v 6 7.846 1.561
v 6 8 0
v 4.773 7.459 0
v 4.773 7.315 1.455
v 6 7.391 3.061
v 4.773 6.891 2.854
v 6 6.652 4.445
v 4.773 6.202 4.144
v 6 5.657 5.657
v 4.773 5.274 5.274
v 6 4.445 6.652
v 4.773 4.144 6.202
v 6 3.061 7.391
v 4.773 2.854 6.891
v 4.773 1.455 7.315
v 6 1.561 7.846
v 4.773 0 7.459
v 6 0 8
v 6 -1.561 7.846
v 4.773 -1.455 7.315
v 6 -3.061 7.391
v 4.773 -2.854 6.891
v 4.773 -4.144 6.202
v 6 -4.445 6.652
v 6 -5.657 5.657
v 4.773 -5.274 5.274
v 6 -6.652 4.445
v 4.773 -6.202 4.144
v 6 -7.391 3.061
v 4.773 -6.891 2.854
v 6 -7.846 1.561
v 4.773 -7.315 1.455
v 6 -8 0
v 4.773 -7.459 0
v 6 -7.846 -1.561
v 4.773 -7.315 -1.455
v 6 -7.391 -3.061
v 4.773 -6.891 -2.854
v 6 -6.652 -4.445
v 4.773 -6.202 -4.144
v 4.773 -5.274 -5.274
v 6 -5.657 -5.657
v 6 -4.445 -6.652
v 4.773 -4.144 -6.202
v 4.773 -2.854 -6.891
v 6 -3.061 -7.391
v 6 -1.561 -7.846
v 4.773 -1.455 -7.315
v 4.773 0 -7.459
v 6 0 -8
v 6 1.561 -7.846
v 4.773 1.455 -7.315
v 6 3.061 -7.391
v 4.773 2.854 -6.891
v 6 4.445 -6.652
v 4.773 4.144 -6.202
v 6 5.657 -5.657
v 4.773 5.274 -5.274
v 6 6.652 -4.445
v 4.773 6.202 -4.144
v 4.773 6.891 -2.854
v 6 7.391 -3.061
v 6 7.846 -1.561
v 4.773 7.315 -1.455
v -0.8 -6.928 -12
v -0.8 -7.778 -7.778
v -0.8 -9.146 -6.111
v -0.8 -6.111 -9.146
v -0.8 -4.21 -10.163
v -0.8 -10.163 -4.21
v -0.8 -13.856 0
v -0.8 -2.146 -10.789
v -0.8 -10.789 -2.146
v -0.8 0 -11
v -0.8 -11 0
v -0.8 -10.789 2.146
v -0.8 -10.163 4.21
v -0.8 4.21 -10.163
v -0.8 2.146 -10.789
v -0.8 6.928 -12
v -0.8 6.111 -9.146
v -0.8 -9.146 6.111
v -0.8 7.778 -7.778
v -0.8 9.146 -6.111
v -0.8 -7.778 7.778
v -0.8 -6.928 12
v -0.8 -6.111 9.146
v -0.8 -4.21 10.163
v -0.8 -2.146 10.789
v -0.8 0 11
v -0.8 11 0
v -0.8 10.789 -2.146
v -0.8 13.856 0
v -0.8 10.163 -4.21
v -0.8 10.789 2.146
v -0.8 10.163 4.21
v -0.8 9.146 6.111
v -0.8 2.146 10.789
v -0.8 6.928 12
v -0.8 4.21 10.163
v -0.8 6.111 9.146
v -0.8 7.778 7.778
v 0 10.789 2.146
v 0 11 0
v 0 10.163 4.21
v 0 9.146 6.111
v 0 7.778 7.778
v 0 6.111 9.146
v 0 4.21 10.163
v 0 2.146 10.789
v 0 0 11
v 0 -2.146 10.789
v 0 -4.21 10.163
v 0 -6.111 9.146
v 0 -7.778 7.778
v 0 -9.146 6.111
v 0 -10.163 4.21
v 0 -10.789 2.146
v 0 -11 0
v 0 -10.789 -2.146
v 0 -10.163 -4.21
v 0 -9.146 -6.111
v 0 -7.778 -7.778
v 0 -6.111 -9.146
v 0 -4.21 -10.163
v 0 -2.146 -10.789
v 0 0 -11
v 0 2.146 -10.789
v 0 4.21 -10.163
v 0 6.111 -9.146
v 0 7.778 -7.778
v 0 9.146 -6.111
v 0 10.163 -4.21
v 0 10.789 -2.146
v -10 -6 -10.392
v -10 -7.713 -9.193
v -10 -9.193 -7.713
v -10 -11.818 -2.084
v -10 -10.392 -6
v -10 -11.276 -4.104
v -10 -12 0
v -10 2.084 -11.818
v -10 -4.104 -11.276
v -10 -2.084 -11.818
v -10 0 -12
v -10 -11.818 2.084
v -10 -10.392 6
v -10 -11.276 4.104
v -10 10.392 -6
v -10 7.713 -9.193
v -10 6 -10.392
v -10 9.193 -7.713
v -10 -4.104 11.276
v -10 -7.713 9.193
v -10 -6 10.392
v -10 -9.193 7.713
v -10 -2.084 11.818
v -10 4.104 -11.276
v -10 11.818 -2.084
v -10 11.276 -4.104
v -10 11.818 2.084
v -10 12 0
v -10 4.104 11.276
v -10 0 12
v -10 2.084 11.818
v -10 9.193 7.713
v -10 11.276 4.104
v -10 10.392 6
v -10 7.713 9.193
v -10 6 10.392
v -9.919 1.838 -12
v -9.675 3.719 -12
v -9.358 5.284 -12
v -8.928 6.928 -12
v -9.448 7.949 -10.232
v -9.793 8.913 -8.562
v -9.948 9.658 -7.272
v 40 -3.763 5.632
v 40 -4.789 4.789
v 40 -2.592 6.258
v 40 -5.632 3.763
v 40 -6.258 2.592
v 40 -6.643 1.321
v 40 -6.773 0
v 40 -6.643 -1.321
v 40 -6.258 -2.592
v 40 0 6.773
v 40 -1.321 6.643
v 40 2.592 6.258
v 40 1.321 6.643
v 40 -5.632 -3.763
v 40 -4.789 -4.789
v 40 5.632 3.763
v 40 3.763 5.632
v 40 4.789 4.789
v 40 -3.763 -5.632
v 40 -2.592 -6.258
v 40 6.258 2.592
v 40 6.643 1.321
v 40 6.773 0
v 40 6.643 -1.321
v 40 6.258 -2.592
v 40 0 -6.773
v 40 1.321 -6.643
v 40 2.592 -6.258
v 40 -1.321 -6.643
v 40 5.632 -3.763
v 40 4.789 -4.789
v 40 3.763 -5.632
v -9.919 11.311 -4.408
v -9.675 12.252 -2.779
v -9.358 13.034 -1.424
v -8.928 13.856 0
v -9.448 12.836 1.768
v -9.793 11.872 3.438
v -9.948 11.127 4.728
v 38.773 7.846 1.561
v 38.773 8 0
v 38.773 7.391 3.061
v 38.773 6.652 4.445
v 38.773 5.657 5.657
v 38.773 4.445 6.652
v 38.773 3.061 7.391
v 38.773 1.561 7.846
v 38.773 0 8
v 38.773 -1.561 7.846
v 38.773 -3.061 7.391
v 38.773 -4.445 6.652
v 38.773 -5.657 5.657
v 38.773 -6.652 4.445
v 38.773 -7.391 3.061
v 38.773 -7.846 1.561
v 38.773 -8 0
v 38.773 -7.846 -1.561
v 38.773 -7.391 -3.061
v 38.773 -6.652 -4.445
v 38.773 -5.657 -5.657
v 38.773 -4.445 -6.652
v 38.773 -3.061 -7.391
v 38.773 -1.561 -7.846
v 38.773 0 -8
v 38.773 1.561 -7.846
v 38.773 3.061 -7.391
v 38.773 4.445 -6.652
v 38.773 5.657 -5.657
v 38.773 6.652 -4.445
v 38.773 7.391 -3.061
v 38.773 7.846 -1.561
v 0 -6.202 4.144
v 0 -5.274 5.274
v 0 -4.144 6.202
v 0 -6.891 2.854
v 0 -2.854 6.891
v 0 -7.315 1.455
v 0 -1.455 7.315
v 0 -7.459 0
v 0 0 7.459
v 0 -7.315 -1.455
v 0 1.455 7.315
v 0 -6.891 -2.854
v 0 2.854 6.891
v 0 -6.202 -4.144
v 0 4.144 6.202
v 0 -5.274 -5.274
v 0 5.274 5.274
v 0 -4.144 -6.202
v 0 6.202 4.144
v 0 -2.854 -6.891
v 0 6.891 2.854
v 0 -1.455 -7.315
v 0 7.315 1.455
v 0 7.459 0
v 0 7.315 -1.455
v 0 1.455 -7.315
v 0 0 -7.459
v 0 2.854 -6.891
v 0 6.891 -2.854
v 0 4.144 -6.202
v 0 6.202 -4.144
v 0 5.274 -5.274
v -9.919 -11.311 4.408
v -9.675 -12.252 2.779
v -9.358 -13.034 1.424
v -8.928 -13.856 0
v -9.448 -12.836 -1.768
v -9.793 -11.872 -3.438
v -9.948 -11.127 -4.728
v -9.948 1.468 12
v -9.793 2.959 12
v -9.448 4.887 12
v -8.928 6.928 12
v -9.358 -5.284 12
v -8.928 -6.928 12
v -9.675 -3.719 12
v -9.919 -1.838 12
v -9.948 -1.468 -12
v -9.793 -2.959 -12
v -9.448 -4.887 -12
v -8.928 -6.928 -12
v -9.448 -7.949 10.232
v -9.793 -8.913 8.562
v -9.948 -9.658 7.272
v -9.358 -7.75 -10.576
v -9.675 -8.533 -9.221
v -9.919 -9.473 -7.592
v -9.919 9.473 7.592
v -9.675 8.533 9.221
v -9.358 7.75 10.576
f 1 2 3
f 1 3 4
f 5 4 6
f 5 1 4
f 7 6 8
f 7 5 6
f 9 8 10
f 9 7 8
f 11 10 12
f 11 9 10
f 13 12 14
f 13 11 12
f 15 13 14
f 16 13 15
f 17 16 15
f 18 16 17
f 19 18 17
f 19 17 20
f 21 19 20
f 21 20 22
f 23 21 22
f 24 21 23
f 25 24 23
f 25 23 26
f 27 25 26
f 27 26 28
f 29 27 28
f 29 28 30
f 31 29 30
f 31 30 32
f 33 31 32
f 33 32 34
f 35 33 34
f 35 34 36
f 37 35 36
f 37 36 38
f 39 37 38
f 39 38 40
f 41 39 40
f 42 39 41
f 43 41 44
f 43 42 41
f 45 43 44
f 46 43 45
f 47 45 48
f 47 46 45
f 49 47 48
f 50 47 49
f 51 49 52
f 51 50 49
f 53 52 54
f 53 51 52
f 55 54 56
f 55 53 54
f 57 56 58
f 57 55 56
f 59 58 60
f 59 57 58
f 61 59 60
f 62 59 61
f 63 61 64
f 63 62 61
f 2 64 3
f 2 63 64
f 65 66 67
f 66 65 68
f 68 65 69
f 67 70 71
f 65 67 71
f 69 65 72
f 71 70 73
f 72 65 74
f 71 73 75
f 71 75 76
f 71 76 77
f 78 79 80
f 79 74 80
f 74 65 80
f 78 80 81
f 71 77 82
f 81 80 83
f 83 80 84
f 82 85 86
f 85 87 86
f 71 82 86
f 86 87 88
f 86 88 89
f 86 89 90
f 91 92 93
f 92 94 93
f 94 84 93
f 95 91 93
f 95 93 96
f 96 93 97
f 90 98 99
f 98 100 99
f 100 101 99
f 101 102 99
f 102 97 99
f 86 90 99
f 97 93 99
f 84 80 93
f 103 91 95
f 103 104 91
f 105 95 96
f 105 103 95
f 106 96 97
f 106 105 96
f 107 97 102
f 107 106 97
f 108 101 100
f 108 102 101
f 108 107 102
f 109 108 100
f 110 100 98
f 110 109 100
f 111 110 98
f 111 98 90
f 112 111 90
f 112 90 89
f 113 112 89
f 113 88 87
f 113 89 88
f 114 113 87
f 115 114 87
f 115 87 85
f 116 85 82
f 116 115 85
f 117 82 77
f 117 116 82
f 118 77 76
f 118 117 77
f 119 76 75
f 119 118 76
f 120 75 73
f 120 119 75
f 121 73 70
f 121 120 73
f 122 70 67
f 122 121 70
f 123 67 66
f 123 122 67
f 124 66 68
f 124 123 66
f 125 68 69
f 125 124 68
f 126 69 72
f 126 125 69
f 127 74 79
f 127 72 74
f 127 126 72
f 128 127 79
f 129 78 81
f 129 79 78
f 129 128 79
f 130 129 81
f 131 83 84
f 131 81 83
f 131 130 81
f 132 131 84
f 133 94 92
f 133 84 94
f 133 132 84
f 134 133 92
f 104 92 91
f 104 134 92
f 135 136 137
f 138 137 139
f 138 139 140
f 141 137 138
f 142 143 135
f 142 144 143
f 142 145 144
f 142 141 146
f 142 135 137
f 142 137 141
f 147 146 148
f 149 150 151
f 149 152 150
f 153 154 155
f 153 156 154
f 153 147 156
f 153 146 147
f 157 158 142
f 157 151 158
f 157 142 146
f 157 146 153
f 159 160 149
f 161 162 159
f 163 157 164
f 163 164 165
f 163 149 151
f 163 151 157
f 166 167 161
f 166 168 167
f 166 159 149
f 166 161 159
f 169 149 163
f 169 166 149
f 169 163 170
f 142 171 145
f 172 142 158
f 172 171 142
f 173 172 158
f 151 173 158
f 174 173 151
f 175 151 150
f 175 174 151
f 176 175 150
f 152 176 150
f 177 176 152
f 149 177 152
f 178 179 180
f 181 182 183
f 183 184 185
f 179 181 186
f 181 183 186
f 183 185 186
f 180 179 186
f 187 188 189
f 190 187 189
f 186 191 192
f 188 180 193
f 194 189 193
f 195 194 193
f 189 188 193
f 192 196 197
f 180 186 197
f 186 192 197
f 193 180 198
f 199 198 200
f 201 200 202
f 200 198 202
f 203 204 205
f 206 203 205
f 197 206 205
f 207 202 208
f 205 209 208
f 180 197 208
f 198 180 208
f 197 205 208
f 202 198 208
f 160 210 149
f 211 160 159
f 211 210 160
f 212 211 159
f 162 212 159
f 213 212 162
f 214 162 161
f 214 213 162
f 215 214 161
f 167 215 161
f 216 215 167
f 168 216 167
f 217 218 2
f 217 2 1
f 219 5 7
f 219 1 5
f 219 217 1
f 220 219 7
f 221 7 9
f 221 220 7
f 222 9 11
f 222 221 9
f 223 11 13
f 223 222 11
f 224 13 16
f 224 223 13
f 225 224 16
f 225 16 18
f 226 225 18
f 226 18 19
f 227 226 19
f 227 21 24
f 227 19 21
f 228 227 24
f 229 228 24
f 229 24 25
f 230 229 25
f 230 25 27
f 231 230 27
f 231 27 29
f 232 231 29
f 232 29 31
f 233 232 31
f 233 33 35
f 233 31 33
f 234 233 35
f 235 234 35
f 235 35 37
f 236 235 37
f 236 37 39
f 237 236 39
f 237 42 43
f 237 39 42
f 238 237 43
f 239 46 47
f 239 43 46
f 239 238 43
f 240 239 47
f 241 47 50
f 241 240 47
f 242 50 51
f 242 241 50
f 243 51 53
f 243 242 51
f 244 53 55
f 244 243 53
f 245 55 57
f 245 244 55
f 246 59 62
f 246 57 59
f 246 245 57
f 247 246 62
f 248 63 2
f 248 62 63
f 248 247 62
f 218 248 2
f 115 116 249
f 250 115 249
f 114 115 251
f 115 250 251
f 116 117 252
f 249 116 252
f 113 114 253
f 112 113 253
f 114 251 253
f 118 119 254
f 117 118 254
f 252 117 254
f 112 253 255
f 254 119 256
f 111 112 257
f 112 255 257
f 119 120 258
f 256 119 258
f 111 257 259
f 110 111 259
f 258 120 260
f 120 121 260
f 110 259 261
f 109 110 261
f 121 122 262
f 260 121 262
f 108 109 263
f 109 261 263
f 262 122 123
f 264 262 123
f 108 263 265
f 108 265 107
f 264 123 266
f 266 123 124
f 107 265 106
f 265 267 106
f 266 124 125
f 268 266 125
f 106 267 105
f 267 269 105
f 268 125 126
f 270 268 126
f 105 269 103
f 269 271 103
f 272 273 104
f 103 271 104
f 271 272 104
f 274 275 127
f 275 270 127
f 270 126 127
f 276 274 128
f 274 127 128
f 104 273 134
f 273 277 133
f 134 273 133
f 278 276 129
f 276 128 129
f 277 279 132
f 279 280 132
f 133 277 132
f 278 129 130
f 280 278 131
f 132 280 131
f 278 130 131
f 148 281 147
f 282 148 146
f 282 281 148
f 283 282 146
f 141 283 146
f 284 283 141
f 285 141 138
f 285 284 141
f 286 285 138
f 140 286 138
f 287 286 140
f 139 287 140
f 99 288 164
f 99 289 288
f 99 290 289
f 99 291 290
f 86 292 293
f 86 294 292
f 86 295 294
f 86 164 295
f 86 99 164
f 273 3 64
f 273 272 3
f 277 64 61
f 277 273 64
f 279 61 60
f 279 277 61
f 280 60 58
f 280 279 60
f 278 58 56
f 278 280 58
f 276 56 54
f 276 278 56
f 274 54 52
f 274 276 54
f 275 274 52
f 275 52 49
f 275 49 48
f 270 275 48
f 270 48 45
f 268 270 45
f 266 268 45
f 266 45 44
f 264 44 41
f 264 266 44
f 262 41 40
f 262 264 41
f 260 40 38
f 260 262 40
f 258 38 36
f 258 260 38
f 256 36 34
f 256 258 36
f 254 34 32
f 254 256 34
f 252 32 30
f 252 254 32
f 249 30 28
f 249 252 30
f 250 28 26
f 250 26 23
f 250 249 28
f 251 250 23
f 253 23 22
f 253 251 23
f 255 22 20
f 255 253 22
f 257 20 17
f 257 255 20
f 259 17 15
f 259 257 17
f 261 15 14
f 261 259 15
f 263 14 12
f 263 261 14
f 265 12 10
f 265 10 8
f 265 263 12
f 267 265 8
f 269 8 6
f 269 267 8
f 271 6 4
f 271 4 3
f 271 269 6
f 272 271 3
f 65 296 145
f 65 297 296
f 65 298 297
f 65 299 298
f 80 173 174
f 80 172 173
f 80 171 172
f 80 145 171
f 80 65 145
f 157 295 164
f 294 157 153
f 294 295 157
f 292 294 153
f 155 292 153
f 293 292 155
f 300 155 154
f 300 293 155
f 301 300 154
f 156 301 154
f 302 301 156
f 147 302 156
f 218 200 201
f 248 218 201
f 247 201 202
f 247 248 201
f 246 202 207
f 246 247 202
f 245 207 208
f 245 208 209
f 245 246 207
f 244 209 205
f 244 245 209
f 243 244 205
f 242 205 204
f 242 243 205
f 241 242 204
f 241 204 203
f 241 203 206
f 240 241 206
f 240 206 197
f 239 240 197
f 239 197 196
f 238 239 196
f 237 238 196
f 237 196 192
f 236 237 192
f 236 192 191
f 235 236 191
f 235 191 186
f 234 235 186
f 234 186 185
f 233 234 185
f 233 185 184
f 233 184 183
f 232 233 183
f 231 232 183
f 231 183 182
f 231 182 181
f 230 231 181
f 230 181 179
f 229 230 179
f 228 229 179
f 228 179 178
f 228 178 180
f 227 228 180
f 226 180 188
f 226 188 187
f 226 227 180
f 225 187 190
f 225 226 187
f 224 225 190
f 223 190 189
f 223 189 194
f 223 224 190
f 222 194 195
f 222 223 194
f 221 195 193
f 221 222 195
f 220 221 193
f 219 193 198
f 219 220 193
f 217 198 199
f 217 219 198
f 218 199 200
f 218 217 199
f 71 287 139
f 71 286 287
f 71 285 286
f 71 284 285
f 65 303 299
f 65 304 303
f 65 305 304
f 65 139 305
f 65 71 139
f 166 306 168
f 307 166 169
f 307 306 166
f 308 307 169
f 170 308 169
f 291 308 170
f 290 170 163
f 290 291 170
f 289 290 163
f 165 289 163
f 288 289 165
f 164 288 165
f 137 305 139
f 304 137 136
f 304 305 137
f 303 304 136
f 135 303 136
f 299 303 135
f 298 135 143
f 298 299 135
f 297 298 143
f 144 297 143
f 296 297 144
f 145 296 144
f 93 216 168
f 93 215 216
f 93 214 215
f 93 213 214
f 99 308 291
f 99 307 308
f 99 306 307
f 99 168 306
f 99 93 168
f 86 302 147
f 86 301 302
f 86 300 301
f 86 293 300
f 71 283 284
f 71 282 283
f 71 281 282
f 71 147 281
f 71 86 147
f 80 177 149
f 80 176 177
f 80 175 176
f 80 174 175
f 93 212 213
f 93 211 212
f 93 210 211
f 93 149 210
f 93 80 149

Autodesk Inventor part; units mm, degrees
ref_plane "YZ Plane" through (0, 0, 0) normal (1, 0, 0) x (0, 1, 0)
ref_plane "XZ Plane" through (0, 0, 0) normal (0, 1, 0) x (-1, 0, 0)
ref_plane "XY Plane" through (0, 0, 0) normal (0, 0, 1) x (1, 0, 0)
sketch "Skizze1" plane through (0, 0, 0) normal (0, 0, 1) x (1, 0, 0)
  line L0 (0, 11) -> (0, 7.4587)
  line L1 (6, 8) -> (40, 8)
  line L2 (40, 8) -> (40, 0)
  line L3 (40, 0) -> (-0.8001, 0)
  line L4 (-4.8801, 0) -> (52.24, 0) projected
  line L5 (-0.8001, 0) -> (-0.8001, 11)
  line L6 (-0.8001, 11) -> (0, 11)
  line L7 (6, 8) -> (4.773, 7.4587)
  line L8 (4.773, 7.4587) -> (0, 7.4587)
  line L9 (0, -1.1) -> (0, 14.3) projected
  dimension "d0" = 40
  dimension "d1" = 34
  dimension "d2" = 16
  dimension "d9" = 0.8001
  dimension "d10" = 22
  dimension "d13" = 1.227
  dimension "d14" = 14.9175
revolve "Körper" add sketch "Skizze1" angle 360 about axis through (40, 0, 0) along (-1, 0, 0)
sketch "Skizze2" plane through (-0.8001, 0, 0) normal (-1, 0, 0) x (0, 0, 1)
  line L0 (0, 13.8564) -> (12, 6.9282)
  line L1 (12, 6.9282) -> (12, -6.9282)
  line L2 (12, -6.9282) -> (0, -13.8564)
  line L3 (0, -13.8564) -> (-12, -6.9282)
  line L4 (-12, -6.9282) -> (-12, 6.9282)
  line L5 (-12, 6.9282) -> (0, 13.8564)
  point P0 (0, 0)
  point P1 (0, 0)
  dimension "d11" = 24
extrude "Kopf" add sketch "Skizze2" along normal blind 9.2
sketch "Skizze4" plane through (0, 0, 0) normal (0, 0, 1) x (1, 0, 0)
  line L0 (-10.0001, 12) -> (-10.0001, 13.8564)
  line L1 (-10.0001, 13.8564) -> (-8.9283, 13.8564)
  line L2 (-8.9283, 13.8564) -> (-10.0001, 12)
  line L3 (-10.9201, 0) -> (1.9599, 0) projected
  line L4 (-0.8001, 13.8564) -> (-10.0001, 13.8564) projected
  line L5 (-10.0001, 6.9282) -> (-10.0001, 13.8564) projected
  dimension "d5" = 30
  dimension "d19" = 24
revolve "Fase1" cut sketch "Skizze4" angle 360 about axis through (-10, 0, 0) along (1, 0, 0)
thread "Gewinde" size "M16x2" class "6g" standard "ANSI Metric M Profile" length 34
chamfer "Fase2" distance 1.2269 distance2 1.227 1 edges at (40, -8, 0) measured on face at (40, -0.1598, 1.3157)
equation "\"d0\" = NLG"
equation "\"d1\" = GEL"
equation "\"d2\" = GD"
equation "\"d10\" = SD2"
equation "\"d14\" = BDM"
equation "\"d11\" = SW"
equation "\"d3\" = KOH - SD"
equation "\"d5\" = ANG1"
equation "\"d19\" = SW0"
equation "\"d15\" = GEL"
equation "\"d6\" = -0.5 * SPD + 0.5 * GD"
equation "\"NLG\" = 40"
equation "\"GD\" = NND"
equation "\"BDM\" = 14.91747"
equation "\"KOH\" = 10"
equation "\"GEL\" = 34"
equation "\"SW\" = 24"
equation "\"SW0\" = 24"
equation "\"SPD\" = NND - 1.2269 * TPU"
equation "\"SD2\" = 22"
equation "\"SD\" = 0.8"
equation "\"ANG1\" = 30deg"
equation "\"GAL\" = 0.61345 * TPU"
equation "\"GUL\" = 0.61345 * TPU"
equation "\"RR\" = 0.6"
equation "\"TOA\" = 30deg"
equation "\"PTC\" = TPU"
equation "\"GD1\" = THREADDIA - 1.2269 * TPU"
equation "\"TPU\" = 2"
equation "\"THREADDIA\" = 16"
equation "\"E0\" = 1.155 * SW"
equation "\"NND\" = 16"
properties part number "DIN 933 - M16  x 40"
